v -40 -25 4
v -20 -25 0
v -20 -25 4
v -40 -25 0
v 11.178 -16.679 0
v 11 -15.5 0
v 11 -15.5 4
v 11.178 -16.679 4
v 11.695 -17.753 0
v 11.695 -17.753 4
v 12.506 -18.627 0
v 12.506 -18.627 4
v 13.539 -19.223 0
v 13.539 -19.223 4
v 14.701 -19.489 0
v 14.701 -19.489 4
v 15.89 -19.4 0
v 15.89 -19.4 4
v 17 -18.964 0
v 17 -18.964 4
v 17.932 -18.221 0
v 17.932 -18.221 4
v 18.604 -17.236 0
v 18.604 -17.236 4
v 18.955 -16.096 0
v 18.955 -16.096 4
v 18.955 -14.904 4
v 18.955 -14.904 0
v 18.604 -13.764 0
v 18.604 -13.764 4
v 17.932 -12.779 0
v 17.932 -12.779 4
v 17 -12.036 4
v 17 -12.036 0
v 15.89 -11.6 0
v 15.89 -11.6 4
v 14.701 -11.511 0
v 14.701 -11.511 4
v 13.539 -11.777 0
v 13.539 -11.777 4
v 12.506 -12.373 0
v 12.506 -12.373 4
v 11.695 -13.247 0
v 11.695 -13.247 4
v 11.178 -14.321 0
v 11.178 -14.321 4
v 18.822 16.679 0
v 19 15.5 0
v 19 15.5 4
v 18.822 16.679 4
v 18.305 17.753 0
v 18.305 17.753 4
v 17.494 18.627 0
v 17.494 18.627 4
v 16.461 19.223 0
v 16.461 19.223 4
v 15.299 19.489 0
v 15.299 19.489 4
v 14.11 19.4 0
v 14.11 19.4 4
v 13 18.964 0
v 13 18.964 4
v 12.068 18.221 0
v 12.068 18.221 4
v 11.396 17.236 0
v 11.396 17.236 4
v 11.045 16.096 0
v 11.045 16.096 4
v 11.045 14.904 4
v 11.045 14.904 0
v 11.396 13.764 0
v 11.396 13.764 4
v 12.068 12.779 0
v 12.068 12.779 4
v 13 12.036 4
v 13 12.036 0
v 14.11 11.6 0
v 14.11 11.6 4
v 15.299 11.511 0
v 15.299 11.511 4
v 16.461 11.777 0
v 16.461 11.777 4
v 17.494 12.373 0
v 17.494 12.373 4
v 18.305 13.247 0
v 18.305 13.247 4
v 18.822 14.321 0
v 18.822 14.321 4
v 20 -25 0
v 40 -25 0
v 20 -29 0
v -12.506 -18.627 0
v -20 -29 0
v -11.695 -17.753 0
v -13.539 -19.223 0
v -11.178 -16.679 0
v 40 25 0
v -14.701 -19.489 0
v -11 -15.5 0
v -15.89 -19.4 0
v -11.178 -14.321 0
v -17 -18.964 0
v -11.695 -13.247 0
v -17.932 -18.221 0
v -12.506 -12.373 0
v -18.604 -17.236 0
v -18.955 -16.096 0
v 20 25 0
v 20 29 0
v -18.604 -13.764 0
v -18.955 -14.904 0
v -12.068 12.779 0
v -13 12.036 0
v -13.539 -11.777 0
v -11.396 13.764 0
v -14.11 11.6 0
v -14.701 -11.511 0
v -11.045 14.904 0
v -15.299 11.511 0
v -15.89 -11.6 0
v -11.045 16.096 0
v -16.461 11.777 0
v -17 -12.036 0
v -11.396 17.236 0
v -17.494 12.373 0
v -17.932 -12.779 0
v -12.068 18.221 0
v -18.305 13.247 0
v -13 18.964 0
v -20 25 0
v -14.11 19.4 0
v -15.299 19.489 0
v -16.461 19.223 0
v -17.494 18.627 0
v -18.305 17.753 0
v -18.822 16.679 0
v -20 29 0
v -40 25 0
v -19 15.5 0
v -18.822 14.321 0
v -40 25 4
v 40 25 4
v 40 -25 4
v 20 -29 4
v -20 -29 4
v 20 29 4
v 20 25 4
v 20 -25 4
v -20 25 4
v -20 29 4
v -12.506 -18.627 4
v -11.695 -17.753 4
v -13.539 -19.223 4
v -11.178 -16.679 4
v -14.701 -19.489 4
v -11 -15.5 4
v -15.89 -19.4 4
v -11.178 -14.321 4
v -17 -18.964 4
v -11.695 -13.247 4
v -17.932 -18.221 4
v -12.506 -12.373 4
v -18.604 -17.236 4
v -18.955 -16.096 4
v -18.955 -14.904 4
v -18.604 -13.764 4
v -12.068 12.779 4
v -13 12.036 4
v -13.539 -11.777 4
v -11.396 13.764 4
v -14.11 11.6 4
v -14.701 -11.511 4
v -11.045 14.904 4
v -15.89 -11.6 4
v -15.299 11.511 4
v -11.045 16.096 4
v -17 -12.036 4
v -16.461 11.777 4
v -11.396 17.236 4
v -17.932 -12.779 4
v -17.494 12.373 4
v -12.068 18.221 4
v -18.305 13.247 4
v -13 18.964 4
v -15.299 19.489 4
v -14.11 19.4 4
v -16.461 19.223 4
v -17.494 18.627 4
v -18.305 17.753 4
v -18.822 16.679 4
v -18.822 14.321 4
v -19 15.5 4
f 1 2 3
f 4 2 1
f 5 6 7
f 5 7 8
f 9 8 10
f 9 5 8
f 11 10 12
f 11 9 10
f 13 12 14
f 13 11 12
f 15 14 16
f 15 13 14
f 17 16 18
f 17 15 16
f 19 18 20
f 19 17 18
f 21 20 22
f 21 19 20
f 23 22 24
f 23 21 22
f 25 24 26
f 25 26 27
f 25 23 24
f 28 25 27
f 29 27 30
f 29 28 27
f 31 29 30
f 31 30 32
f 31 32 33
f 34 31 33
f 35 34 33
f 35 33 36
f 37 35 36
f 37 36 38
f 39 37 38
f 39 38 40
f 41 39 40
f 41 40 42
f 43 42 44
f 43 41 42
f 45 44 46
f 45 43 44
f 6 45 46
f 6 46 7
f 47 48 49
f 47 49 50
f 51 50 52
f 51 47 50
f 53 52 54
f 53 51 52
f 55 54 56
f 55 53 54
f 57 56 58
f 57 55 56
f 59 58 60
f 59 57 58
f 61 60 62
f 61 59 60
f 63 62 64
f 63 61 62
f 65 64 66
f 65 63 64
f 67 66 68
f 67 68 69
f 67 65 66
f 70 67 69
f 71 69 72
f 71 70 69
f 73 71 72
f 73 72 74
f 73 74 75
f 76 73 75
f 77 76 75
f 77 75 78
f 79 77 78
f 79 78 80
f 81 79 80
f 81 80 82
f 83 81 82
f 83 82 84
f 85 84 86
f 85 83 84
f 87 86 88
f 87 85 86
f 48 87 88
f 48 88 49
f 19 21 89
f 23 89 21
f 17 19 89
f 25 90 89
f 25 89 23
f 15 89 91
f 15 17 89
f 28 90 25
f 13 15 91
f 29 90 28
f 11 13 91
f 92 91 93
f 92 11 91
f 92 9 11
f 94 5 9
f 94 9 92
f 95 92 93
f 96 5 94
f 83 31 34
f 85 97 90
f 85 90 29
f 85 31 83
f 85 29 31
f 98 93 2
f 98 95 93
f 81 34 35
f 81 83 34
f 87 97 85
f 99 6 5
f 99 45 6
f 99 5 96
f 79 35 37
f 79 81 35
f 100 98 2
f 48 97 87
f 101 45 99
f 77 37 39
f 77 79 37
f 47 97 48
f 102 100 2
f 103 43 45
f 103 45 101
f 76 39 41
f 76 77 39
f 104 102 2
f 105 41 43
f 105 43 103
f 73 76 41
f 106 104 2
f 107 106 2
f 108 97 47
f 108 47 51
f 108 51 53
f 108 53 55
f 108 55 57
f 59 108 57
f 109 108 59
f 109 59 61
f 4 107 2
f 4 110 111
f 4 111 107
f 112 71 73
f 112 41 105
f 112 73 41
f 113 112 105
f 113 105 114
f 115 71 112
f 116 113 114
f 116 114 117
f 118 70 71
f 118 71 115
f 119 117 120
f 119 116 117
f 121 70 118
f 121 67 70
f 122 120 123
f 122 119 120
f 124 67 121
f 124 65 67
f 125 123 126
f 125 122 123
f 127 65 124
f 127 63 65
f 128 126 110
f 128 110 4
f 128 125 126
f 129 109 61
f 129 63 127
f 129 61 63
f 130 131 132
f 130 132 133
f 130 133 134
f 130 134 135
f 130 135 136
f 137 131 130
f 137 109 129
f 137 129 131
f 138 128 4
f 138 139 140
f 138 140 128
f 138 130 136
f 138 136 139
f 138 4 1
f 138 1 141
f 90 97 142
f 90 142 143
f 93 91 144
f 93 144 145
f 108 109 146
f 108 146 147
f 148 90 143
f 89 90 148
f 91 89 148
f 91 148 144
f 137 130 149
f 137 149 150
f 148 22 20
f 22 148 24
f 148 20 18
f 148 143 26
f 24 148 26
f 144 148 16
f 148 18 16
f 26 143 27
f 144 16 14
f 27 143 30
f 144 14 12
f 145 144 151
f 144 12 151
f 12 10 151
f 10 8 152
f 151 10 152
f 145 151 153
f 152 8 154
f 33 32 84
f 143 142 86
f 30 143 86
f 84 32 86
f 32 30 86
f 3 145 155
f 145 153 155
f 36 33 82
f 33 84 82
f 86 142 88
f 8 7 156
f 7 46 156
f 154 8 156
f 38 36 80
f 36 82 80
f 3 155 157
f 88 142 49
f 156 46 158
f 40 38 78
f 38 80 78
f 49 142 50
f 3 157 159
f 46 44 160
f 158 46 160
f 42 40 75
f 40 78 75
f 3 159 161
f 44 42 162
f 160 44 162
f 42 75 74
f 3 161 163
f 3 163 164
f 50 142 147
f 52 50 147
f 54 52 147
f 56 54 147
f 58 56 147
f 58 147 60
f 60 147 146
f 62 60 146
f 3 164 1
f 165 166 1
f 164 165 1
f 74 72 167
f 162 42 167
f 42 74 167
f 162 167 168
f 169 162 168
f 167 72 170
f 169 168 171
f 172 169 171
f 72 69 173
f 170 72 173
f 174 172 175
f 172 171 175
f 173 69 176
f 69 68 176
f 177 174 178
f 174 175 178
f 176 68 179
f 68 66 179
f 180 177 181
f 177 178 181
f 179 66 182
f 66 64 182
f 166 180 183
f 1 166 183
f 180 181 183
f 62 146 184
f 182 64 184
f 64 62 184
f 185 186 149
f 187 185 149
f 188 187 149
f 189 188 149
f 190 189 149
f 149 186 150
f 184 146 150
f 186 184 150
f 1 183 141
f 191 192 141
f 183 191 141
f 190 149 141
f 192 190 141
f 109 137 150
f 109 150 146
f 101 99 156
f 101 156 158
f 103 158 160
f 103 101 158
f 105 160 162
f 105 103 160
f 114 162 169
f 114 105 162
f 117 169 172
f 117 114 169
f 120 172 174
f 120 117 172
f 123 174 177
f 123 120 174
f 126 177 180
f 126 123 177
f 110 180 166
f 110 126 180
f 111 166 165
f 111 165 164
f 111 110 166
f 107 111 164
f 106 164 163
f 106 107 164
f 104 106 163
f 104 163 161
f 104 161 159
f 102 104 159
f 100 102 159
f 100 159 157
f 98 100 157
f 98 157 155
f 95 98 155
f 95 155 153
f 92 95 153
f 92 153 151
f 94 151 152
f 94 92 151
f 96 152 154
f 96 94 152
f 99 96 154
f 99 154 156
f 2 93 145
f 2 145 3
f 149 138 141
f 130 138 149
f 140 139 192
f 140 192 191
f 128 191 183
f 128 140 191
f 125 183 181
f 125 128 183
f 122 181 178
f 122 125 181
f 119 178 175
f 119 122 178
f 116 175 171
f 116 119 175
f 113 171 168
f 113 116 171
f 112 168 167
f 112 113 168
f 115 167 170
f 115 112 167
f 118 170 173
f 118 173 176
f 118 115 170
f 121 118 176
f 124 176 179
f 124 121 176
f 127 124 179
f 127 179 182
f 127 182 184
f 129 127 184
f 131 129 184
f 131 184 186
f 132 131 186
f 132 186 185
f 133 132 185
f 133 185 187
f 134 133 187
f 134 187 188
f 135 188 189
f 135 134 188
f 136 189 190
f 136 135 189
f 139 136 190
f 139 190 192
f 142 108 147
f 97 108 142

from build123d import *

# Parameters (mm, degrees)
SKETCH1_R           = 4
BOSS_EXTRUDE1_DEPTH = 4


with BuildPart() as part:
    # Sketch1 → Boss-Extrude1 (new body)
    with BuildSketch(Plane.XY):
        Polygon((-20, 29), (20, 29), (20, 25), (40, 25), (40, -25), (20, -25), (20, -29), (-20, -29), (-20, -25), (-40, -25), (-40, 25), (-20, 25), align=None)
        with Locations((15, 15.5)):
            Circle(SKETCH1_R, mode=Mode.SUBTRACT)
        with Locations(Location((-15, 15.5, 0), (0, 0, 180))):
            Circle(SKETCH1_R, mode=Mode.SUBTRACT)
        with Locations((-15, -15.5)):
            Circle(SKETCH1_R, mode=Mode.SUBTRACT)
        with Locations(Location((15, -15.5, 0), (0, 0, 180))):
            Circle(SKETCH1_R, mode=Mode.SUBTRACT)
    extrude(amount=BOSS_EXTRUDE1_DEPTH)


solid = part.part
